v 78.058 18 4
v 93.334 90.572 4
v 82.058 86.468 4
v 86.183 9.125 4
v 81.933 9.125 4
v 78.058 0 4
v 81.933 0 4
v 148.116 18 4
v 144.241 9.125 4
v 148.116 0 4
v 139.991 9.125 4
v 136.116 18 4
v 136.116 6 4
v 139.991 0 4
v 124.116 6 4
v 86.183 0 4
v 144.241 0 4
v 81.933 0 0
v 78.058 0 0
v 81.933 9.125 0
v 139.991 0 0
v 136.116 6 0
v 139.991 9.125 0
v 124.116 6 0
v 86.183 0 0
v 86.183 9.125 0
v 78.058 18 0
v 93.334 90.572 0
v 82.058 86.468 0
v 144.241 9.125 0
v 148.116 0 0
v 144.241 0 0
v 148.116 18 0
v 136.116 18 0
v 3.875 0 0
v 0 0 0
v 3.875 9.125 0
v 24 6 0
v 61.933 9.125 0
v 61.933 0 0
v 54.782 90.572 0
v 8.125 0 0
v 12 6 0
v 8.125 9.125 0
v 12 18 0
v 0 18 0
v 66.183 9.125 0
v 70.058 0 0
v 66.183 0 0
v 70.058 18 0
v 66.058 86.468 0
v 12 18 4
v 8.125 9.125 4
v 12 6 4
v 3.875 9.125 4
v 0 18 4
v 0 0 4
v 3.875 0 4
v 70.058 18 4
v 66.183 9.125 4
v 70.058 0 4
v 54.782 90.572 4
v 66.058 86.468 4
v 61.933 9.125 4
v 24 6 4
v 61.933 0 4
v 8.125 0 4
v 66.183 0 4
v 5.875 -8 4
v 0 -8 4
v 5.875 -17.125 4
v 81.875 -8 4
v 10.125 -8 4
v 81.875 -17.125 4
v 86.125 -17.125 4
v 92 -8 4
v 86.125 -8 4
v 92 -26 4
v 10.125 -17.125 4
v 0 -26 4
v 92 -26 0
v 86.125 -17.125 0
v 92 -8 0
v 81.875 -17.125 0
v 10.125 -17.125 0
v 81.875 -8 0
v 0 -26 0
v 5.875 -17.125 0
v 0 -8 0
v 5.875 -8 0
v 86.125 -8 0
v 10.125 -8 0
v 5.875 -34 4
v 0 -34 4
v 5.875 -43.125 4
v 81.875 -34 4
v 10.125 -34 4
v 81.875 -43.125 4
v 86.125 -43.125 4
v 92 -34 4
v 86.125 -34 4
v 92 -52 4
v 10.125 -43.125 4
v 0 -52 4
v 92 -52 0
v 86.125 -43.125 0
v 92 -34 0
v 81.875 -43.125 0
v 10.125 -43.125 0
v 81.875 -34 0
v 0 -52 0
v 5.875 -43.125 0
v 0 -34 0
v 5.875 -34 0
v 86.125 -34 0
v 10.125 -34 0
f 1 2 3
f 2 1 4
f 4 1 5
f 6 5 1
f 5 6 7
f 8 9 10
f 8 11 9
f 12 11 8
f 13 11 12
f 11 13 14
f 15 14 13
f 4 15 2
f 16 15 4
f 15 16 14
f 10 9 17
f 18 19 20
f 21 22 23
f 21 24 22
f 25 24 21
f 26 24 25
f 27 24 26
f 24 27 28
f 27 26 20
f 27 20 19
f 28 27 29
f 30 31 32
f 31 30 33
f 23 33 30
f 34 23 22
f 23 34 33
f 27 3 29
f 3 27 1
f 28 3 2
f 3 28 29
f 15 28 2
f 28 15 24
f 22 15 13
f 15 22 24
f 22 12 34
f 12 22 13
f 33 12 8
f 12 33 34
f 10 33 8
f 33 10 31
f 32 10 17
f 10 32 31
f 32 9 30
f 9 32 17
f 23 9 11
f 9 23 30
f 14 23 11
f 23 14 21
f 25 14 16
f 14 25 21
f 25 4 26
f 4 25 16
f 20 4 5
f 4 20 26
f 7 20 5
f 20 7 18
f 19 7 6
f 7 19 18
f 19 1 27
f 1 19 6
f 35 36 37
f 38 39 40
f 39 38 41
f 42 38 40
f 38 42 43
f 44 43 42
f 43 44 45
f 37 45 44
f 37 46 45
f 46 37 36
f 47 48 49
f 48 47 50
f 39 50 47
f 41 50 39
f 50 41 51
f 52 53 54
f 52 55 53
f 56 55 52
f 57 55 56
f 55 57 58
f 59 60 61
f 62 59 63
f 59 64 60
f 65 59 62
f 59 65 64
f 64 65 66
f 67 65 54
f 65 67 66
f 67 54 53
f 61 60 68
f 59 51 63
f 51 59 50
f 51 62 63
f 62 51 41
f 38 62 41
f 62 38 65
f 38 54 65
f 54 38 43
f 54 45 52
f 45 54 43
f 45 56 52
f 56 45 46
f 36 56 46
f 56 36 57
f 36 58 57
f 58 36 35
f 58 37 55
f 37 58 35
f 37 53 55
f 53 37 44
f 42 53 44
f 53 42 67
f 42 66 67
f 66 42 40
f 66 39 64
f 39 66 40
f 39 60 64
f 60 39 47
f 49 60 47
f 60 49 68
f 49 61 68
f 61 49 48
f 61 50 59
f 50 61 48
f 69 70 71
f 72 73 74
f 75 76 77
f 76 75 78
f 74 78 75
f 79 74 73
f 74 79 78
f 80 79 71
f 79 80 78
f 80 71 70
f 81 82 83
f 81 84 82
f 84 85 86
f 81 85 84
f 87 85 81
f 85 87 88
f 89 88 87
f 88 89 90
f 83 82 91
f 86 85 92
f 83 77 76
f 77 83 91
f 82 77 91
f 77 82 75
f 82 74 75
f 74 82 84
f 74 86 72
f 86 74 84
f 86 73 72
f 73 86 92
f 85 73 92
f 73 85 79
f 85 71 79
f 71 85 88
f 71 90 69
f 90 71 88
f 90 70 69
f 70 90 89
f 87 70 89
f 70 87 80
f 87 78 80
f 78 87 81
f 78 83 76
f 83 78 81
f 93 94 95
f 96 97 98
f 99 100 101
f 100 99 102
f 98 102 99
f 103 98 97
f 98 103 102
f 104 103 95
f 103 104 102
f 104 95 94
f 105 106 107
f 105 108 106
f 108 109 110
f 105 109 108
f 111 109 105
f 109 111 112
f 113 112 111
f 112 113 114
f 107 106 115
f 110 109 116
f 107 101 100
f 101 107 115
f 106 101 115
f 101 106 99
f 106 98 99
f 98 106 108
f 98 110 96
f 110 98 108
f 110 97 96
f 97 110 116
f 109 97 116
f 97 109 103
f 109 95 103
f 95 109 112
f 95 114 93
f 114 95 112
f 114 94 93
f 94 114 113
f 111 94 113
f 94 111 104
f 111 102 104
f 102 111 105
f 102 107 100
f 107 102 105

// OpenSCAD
// ── SUPORTE DE TELEMÓVEL DESMONTÁVEL (DE BOLSO) — PERSONALIZADO (texto/imagem à face, 3MF) ──
//
// Quatro placas planas que encaixam umas nas outras (meia-madeira, sem cola nem parafusos): duas
// laterais com o perfil do suporte (base, lábio, ranhura para o telemóvel e encosto inclinado) e
// duas travessas — a da frente faz de lábio e a de trás fecha a base. Desmonta-se e fica plano,
// para levar no bolso ou na mala. Tudo imprime deitado, sem suportes.
//
// A geometria está escrita montada (x para trás a partir da frente, y para cima, z na largura:
// lateral esquerda em z = 0..t, direita em z = W - t..W) e cada peça é depois deitada na mesa
// (_P(peca)) com a face de fora para cima.
//
// Texto ou imagem embutidos À FACE, noutra cor, na frente da travessa da frente (zona "frente")
// e/ou na face de fora das duas laterais (zona "lados" — o mesmo nas duas). Sai em 3MF
// (generation_schema.multicor):
//   "corpo"  as 4 peças com os rebaixos     "frente" / "lados"  enchimento de cada zona
//   "frente_solta" / "lados_solta"  sem AMS: o enchimento deitado na mesa, com folga, para colar
// (sem modo: tudo, com cores — só para ver no OpenSCAD; montado = true mostra-o montado).
// Do servidor: esc_texto_frente (lib/textFit.js; o texto dos lados não é ajustado, só recortado)
//   e frente_pts / frente_paths / tem_frente, lados_pts / lados_paths / tem_lados (lib/logo.js).
// Se mudares as fórmulas, muda também Maker_Pro_Frontend_Prod/lib/suportesTelemovelExtra.ts.

function _W()  = is_undef(largura) ? 80 : largura;
function _t()  = is_undef(espessura) ? 4 : espessura;
function _a()  = is_undef(angulo) ? 20 : angulo;
function _Le() = is_undef(altura_encosto) ? 90 : altura_encosto;
function _g()  = is_undef(espessura_telemovel) ? 12 : espessura_telemovel;
function _hb() = is_undef(altura_travessa) ? 18 : altura_travessa;
function _f()  = is_undef(folga_encaixe) ? 0.25 : folga_encaixe;
OV  = 6;                                                             // travessas: saem 6 mm para fora das laterais
XB0 = 4;                                                             // travessa da frente: a 4 mm da frente
WE  = 12;                                                            // largura do encosto (na lateral)

function _xg0() = 2 * XB0 + _t();                                    // frente da ranhura do telemóvel
function _xg1() = _xg0() + _g();                                     // pé do encosto
function _yf()  = min(6, _hb() - 4);                                 // fundo da ranhura
function _T()   = [_xg1(), _yf()] + _Le() * [sin(_a()), cos(_a())];  // topo do encosto (frente)
function _Tb()  = _T() + WE * [cos(_a()), -sin(_a())];               // topo do encosto (trás)
function _Lb()  = max(_Tb()[0] + 4, _xg1() + 30);                    // comprimento da base
function _xr()  = _Lb() - XB0 - _t();                                // travessa de trás

function _lat_pts() = [[0, 0], [_Lb(), 0], [_Lb(), _hb()], _Tb(), _T(), [_xg1(), _yf()], [_xg0(), _yf()], [_xg0(), _hb()], [0, _hb()]];
module rasgos_lateral() {                                            // de baixo até meia altura da travessa
    for (x = [XB0, _xr()]) translate([x - _f() / 2, -1]) square([_t() + _f(), _hb() / 2 + _f() / 2 + 1]);
}
module perfil_lateral() { difference() { polygon(_lat_pts()); rasgos_lateral(); } }
module perfil_travessa() {                                           // em (z, y); de cima até meia altura
    W = _W(); t = _t(); f = _f();
    difference() {
        translate([-OV, 0]) square([W + 2 * OV, _hb()]);
        for (z0 = [0, W - t]) translate([z0 - f / 2, _hb() / 2 - f / 2]) square([t + f, _hb()]);
    }
}

// peças montadas
module lateral(lado) { translate([0, 0, lado == "esq" ? 0 : _W() - _t()]) linear_extrude(height = _t()) perfil_lateral(); }
module travessa(x0) { translate([x0, 0, 0]) multmatrix([[0, 0, 1, 0], [0, 1, 0, 0], [1, 0, 0, 0], [0, 0, 0, 1]]) linear_extrude(height = _t()) perfil_travessa(); }
// (a matriz troca x com z: o perfil (z, y) fica no plano zy e a espessura vai em x)

// montado → deitado na mesa, face de fora para cima (rotações próprias)
function _P(peca) =
    peca == "lat_esq" ? [[-1, 0, 0, 2 * _Lb() + 8], [0, 1, 0, 0], [0, 0, -1, _t()], [0, 0, 0, 1]]
  : peca == "lat_dir" ? [[1, 0, 0, 0], [0, 1, 0, 0], [0, 0, 1, -(_W() - _t())], [0, 0, 0, 1]]
  : peca == "trav_f"  ? [[0, 0, 1, OV], [0, 1, 0, -(_hb() + 8)], [-1, 0, 0, XB0 + _t()], [0, 0, 0, 1]]
  :                     [[0, 0, 1, OV], [0, 1, 0, -2 * (_hb() + 8)], [-1, 0, 0, _xr() + _t()], [0, 0, 0, 1]];
function _montado() = !is_undef(montado) && montado == true;
module colocar(peca) { if (_montado()) children(); else multmatrix(_P(peca)) children(); }

// ══ personalização: texto/imagem à face ══
MARG = 4;                                                            // margem às arestas (mm)
MV = 1;                                                              // margem em altura (travessa)
MF = 9;                                                              // travessa: o texto fica entre as laterais
function _modo()  = is_undef(modo) ? "tudo" : modo;
function _fonte() = is_undef(fonte) ? "Open Sans" : fonte;
function _dp()    = max(0.4, min(is_undef(profundidade_embutido) ? 1 : profundidade_embutido, _t() - 1.5));
function _conteudo(z) = z == "frente" ? (is_undef(conteudo_frente) ? "Texto" : conteudo_frente)
                                      : (is_undef(conteudo_lados) ? "Nada" : conteudo_lados);
function _texto(z) = z == "frente" ? (is_undef(texto_frente) ? "pp3d" : texto_frente) : (is_undef(texto_lados) ? "" : texto_lados);
function _tam(z)   = z == "frente" ? (is_undef(tamanho_texto_frente) ? 10 : tamanho_texto_frente) : (is_undef(tamanho_texto_lados) ? 7 : tamanho_texto_lados);
function _esc(z)   = z == "frente" ? max(0.05, min(1, is_undef(esc_texto_frente) ? 1 : esc_texto_frente)) : 1;
function _tem_img(z) = z == "frente" ? (!is_undef(tem_frente) && tem_frente == true && !is_undef(frente_pts) && len(frente_pts) >= 3)
                                     : (!is_undef(tem_lados) && tem_lados == true && !is_undef(lados_pts) && len(lados_pts) >= 3);
function _ativa(z) = _conteudo(z) == "Texto" ? len(_texto(z)) > 0 : _conteudo(z) == "Imagem" ? _tem_img(z) : false;

// centro do texto nas laterais: a 35 % da altura do encosto, a meio entre o encosto e a parte de trás
function _Cy() = _yf() + 0.35 * (_T()[1] - _yf());
function _Cx() = let(xa = _xg1() + (_Cy() - _yf()) * tan(_a()),
                     xb = _Cy() <= _hb() ? _Lb() : _Lb() - (_Cy() - _hb()) * (_Lb() - _Tb()[0]) / (_Tb()[1] - _hb()))
                 (xa + xb) / 2;
// colocações de cada zona: [matriz face → peça montada, peça, lado (para a região)]
function _col(z) = z == "frente"
    ? [[[[0, 0, -1, XB0], [0, 1, 0, _hb() / 2], [1, 0, 0, _W() / 2], [0, 0, 0, 1]], "trav_f", "frente"]]
    : [[[[-1, 0, 0, _Cx()], [0, 1, 0, _Cy()], [0, 0, -1, 0], [0, 0, 0, 1]], "lat_esq", "esq"],
       [[[1, 0, 0, _Cx()], [0, 1, 0, _Cy()], [0, 0, 1, _W()], [0, 0, 0, 1]], "lat_dir", "dir"]];

module zona(lado) {                                                  // região útil no plano da face (u, v)
    if (lado == "frente") translate([-(_W() / 2 - MF), -(_hb() / 2 - MV)]) square([_W() - 2 * MF, _hb() - 2 * MV]);
    else mirror([lado == "esq" ? 1 : 0, 0]) translate([-_Cx(), -_Cy()]) offset(r = -MARG, $fn = 24) perfil_lateral();
}
module conteudo2d(z, lado) {
    intersection() {
        zona(lado);
        if (_conteudo(z) == "Texto")
            scale(_esc(z)) offset(delta = 0.01)
                text(_texto(z), size = _tam(z), font = _fonte(), halign = "center", valign = "center", $fn = 16);
        else if (_conteudo(z) == "Imagem" && _tem_img(z)) {
            if (z == "frente") polygon(points = frente_pts, paths = frente_paths);
            else polygon(points = lados_pts, paths = lados_paths);
        }
    }
}
module na_face(z, w0, w1, so_peca = "") {
    for (c = _col(z)) if (so_peca == "" || so_peca == c[1])
        colocar(c[1]) multmatrix(c[0]) translate([0, 0, w0]) linear_extrude(height = w1 - w0) conteudo2d(z, c[2]);
}
module enchimento(z) { if (_ativa(z)) na_face(z, -_dp(), 0); }

function _fe() = max(0, min(0.5, is_undef(folga_embutido) ? 0.15 : folga_embutido));
module solta(z) {
    if (_ativa(z)) for (i = [0 : len(_col(z)) - 1])
        translate([i * (_W() + 10), 0]) linear_extrude(height = _dp()) offset(delta = -_fe()) conteudo2d(z, _col(z)[i][2]);
}

module peca(nome) {
    colocar(nome) if (nome == "lat_esq") lateral("esq");
                  else if (nome == "lat_dir") lateral("dir");
                  else if (nome == "trav_f") travessa(XB0);
                  else travessa(_xr());
}
module corpo() {
    for (p = ["lat_esq", "lat_dir", "trav_f", "trav_t"])
        difference() {
            peca(p);
            for (z = ["frente", "lados"]) if (_ativa(z)) na_face(z, -_dp(), 0.5, p);
        }
}

if (_modo() == "corpo") corpo();
else if (_modo() == "frente") enchimento("frente");
else if (_modo() == "lados") enchimento("lados");
else if (_modo() == "frente_solta") solta("frente");
else if (_modo() == "lados_solta") solta("lados");
else {
    color(is_undef(cor_suporte) ? "#111111" : cor_suporte) corpo();
    color(is_undef(cor_frente) ? "#FFFFFF" : cor_frente) enchimento("frente");
    color(is_undef(cor_lados) ? "#FFFFFF" : cor_lados) enchimento("lados");
}
